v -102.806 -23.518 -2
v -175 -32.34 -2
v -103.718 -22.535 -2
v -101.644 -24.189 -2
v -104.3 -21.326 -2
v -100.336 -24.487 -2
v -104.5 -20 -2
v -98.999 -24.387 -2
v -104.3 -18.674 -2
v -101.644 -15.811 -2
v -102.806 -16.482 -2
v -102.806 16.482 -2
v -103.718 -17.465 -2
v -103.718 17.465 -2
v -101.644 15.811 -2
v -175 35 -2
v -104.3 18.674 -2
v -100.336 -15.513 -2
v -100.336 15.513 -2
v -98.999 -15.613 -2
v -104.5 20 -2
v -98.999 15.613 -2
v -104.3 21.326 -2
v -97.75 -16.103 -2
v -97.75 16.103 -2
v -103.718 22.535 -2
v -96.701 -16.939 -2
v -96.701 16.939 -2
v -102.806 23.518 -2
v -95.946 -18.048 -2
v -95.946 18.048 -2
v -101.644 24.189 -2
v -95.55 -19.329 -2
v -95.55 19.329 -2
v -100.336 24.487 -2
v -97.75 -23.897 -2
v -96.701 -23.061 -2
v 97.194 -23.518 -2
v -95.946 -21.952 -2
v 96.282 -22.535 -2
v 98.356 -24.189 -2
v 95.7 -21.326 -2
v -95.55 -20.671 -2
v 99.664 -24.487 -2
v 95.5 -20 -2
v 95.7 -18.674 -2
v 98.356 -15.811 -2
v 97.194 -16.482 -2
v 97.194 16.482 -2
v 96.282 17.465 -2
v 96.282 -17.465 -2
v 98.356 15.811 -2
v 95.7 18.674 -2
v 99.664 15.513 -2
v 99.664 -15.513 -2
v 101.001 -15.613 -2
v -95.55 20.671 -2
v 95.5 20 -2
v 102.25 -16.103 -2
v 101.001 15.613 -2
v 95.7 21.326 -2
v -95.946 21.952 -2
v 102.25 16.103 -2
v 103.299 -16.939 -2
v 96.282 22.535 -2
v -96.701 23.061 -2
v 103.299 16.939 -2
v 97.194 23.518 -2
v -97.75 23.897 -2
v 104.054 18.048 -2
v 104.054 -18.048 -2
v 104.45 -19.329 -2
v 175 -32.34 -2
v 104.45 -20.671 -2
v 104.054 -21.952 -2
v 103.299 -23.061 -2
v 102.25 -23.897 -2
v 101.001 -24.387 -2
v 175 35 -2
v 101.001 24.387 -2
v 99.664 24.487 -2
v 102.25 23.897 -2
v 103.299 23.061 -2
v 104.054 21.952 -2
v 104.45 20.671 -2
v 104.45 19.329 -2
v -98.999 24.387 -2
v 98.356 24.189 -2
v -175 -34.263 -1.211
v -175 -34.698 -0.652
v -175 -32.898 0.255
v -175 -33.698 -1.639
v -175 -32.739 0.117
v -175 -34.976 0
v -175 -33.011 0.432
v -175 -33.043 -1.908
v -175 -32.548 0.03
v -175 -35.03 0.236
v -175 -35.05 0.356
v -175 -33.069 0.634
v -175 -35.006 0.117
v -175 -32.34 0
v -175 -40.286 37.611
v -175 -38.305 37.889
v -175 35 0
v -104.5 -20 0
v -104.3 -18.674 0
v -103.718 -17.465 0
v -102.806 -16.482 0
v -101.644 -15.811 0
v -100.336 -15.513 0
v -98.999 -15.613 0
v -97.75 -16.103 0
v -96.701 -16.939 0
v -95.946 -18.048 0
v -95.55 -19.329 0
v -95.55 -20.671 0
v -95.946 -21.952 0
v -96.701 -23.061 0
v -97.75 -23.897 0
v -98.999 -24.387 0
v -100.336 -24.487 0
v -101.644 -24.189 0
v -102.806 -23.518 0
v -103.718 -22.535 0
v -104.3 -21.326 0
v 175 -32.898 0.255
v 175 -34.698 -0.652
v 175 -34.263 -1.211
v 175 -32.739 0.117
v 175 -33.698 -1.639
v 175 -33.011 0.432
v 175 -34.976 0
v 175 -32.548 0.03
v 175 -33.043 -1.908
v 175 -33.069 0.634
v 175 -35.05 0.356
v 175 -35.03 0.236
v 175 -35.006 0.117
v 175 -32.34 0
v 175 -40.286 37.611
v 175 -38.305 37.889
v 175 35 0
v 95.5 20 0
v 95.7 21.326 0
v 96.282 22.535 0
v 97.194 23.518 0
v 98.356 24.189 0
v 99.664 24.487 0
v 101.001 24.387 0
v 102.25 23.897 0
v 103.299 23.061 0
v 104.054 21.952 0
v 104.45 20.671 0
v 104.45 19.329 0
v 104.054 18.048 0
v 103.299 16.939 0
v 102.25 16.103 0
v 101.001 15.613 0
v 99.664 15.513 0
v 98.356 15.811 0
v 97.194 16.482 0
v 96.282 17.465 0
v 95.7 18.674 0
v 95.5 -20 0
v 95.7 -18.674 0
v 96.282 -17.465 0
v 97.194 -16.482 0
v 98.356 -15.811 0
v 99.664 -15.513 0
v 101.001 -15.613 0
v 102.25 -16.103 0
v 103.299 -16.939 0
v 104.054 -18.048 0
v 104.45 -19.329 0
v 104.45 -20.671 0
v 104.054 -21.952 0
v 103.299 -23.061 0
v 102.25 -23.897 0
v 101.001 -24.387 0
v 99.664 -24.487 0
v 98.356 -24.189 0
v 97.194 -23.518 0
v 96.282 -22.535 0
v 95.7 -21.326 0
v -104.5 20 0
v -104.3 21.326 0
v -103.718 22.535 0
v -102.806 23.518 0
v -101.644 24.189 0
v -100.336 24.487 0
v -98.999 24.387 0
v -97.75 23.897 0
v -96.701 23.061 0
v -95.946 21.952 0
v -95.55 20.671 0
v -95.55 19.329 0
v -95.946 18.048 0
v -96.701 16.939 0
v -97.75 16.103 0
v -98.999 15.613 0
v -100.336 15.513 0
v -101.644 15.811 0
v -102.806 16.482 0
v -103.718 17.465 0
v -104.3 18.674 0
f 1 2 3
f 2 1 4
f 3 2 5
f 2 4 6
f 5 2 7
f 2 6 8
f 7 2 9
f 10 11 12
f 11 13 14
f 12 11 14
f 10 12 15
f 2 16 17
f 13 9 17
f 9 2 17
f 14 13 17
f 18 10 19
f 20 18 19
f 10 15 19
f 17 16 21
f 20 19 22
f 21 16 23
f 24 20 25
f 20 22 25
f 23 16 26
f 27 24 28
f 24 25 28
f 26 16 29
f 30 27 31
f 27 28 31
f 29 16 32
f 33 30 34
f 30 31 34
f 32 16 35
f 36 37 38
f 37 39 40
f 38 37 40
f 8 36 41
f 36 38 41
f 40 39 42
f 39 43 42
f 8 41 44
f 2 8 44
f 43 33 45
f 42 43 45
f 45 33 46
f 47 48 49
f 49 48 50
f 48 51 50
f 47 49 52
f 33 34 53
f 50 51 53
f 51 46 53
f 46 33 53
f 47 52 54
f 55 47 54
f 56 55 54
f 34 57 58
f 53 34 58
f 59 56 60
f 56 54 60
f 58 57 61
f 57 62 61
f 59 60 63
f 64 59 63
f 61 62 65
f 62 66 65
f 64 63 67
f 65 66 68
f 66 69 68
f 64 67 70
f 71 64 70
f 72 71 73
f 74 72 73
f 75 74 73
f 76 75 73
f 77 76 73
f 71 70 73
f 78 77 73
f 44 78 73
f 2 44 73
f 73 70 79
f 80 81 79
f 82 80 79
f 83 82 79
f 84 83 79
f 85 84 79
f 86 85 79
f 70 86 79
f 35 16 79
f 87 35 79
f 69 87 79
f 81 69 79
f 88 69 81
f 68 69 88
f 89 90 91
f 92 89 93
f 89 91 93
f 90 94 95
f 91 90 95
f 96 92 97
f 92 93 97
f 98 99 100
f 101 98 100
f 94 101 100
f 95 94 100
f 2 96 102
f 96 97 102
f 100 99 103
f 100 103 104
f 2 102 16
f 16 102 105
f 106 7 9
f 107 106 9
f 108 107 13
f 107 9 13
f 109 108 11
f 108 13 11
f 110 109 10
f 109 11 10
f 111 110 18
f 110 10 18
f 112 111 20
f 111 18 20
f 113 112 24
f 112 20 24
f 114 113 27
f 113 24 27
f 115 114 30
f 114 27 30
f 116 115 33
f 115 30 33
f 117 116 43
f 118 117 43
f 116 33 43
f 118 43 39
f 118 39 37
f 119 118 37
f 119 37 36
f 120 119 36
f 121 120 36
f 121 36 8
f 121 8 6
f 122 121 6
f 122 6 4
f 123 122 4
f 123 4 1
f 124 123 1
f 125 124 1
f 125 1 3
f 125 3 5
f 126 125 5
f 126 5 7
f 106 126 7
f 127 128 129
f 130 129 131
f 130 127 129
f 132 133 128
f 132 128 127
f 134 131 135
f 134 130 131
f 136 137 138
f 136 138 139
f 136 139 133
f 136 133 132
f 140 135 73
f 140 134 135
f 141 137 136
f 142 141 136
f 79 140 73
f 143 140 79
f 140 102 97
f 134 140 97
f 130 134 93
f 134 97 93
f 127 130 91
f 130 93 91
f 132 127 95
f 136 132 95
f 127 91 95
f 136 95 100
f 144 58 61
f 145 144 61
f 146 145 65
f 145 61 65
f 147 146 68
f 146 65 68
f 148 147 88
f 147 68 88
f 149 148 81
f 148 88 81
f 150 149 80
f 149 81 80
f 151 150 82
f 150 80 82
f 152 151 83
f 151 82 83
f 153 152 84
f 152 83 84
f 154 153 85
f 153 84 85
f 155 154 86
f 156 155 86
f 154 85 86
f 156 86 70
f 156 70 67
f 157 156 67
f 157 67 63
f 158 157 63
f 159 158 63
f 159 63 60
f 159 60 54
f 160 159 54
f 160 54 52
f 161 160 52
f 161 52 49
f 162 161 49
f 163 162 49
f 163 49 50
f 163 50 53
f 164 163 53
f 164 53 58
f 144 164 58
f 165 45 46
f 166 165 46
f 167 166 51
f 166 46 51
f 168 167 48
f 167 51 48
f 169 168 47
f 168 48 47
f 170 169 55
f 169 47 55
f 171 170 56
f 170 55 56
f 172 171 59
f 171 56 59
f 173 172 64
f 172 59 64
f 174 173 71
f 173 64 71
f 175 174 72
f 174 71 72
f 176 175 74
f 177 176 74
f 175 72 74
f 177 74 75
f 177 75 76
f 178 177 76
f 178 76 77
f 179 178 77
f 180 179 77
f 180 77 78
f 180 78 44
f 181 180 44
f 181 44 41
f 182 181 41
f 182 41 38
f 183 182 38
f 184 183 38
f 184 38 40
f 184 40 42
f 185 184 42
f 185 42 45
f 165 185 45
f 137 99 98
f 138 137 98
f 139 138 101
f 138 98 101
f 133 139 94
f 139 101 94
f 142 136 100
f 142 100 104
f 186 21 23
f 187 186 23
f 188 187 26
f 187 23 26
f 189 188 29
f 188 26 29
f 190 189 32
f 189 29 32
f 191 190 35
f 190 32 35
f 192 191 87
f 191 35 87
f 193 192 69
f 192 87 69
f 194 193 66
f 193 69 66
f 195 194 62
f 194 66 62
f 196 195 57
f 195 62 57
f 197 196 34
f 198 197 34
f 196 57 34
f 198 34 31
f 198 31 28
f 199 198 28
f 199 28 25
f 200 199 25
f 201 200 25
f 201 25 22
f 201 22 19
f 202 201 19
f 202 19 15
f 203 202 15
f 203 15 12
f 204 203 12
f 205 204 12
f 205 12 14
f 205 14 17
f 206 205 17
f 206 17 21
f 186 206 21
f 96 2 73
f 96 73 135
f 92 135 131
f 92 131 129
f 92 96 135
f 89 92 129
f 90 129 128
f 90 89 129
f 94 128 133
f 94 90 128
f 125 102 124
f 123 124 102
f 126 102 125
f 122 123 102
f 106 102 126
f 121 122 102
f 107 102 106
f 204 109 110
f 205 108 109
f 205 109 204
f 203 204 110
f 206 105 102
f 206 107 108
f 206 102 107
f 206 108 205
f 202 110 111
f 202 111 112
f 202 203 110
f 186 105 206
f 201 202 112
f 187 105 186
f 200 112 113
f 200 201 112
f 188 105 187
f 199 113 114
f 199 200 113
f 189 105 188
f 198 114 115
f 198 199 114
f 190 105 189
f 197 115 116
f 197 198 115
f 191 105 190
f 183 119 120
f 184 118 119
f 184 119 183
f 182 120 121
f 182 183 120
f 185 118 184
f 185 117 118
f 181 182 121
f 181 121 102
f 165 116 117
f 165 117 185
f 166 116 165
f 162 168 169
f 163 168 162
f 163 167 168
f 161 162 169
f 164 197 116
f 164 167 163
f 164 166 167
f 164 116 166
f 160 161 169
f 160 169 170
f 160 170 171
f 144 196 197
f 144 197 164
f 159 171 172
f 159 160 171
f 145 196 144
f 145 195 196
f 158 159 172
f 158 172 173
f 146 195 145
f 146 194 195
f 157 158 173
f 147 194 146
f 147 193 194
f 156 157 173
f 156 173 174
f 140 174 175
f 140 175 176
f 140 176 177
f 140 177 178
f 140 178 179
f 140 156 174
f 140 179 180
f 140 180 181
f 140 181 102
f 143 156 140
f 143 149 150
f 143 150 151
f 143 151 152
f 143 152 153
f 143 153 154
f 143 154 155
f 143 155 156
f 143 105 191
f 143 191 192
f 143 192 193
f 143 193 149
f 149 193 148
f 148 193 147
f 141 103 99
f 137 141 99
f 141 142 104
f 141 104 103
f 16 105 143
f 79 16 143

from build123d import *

# Parameters (mm, degrees)
SKETCH1_W            = 350
SKETCH1_H            = 70
BASE_FLANGE1_DEPTH   = 2
EDGE_FLANGE1_START   = -175
EDGE_FLANGE1_DEPTH   = 350
EDGE_FLANGE1_2_DEPTH = 350
M8_CLEARANCE_HOLE1_D = 9


# Read off the part's stored shape, not the designer's step: Edge-Flange1
# Sheet-metal steps are written as plain solids
with BuildPart() as part:
    # Sketch1 → Base-Flange1 (new body)
    with BuildSketch(Plane.XY):
        Rectangle(SKETCH1_W, SKETCH1_H)
    extrude(amount=-BASE_FLANGE1_DEPTH)

    # Edge-Flange1 outline → Edge-Flange1 (cut)
    with BuildSketch(Plane.YZ.offset(EDGE_FLANGE1_START)):
        with BuildLine():
            ThreePointArc((-32.340028244, -2), (-33.994295453, -1.443395312), (-34.975630642, 0))
            Line((-34.975630642, 0), (-35, 0))
            Line((-35, 0), (-35, -2))
            Line((-35, -2), (-32.340028244, -2))
        make_face()
    extrude(amount=EDGE_FLANGE1_DEPTH, mode=Mode.SUBTRACT)

    # Edge-Flange1 2 outline → Edge-Flange1 2 (add)
    with BuildSketch(Plane.YZ.offset(EDGE_FLANGE1_START)):
        with BuildLine():
            Line((-40.285842369, 37.61072275), (-35.049995841, 0.355738892))
            ThreePointArc((-35.049995841, 0.355738892), (-35.018725163, 0.176633592), (-34.975630642, 0))
            Line((-34.975630642, 0), (-32.340028244, 0))
            ThreePointArc((-32.340028244, 0), (-32.823281325, 0.180680923), (-33.069459703, 0.634085094))
            Line((-33.069459703, 0.634085094), (-38.305306232, 37.889068952))
            Line((-38.305306232, 37.889068952), (-40.285842369, 37.61072275))
        make_face()
    extrude(amount=EDGE_FLANGE1_2_DEPTH)

    # M8 Clearance Hole1 (through all)
    with Locations(Plane(origin=(-100, 20, 0), x_dir=(1, 0, 0), z_dir=(0, 0, 1))):
        with Locations((0, 0), (0, -40), (200, -40), (200, 0)):
            Hole(M8_CLEARANCE_HOLE1_D / 2)


solid = part.part
